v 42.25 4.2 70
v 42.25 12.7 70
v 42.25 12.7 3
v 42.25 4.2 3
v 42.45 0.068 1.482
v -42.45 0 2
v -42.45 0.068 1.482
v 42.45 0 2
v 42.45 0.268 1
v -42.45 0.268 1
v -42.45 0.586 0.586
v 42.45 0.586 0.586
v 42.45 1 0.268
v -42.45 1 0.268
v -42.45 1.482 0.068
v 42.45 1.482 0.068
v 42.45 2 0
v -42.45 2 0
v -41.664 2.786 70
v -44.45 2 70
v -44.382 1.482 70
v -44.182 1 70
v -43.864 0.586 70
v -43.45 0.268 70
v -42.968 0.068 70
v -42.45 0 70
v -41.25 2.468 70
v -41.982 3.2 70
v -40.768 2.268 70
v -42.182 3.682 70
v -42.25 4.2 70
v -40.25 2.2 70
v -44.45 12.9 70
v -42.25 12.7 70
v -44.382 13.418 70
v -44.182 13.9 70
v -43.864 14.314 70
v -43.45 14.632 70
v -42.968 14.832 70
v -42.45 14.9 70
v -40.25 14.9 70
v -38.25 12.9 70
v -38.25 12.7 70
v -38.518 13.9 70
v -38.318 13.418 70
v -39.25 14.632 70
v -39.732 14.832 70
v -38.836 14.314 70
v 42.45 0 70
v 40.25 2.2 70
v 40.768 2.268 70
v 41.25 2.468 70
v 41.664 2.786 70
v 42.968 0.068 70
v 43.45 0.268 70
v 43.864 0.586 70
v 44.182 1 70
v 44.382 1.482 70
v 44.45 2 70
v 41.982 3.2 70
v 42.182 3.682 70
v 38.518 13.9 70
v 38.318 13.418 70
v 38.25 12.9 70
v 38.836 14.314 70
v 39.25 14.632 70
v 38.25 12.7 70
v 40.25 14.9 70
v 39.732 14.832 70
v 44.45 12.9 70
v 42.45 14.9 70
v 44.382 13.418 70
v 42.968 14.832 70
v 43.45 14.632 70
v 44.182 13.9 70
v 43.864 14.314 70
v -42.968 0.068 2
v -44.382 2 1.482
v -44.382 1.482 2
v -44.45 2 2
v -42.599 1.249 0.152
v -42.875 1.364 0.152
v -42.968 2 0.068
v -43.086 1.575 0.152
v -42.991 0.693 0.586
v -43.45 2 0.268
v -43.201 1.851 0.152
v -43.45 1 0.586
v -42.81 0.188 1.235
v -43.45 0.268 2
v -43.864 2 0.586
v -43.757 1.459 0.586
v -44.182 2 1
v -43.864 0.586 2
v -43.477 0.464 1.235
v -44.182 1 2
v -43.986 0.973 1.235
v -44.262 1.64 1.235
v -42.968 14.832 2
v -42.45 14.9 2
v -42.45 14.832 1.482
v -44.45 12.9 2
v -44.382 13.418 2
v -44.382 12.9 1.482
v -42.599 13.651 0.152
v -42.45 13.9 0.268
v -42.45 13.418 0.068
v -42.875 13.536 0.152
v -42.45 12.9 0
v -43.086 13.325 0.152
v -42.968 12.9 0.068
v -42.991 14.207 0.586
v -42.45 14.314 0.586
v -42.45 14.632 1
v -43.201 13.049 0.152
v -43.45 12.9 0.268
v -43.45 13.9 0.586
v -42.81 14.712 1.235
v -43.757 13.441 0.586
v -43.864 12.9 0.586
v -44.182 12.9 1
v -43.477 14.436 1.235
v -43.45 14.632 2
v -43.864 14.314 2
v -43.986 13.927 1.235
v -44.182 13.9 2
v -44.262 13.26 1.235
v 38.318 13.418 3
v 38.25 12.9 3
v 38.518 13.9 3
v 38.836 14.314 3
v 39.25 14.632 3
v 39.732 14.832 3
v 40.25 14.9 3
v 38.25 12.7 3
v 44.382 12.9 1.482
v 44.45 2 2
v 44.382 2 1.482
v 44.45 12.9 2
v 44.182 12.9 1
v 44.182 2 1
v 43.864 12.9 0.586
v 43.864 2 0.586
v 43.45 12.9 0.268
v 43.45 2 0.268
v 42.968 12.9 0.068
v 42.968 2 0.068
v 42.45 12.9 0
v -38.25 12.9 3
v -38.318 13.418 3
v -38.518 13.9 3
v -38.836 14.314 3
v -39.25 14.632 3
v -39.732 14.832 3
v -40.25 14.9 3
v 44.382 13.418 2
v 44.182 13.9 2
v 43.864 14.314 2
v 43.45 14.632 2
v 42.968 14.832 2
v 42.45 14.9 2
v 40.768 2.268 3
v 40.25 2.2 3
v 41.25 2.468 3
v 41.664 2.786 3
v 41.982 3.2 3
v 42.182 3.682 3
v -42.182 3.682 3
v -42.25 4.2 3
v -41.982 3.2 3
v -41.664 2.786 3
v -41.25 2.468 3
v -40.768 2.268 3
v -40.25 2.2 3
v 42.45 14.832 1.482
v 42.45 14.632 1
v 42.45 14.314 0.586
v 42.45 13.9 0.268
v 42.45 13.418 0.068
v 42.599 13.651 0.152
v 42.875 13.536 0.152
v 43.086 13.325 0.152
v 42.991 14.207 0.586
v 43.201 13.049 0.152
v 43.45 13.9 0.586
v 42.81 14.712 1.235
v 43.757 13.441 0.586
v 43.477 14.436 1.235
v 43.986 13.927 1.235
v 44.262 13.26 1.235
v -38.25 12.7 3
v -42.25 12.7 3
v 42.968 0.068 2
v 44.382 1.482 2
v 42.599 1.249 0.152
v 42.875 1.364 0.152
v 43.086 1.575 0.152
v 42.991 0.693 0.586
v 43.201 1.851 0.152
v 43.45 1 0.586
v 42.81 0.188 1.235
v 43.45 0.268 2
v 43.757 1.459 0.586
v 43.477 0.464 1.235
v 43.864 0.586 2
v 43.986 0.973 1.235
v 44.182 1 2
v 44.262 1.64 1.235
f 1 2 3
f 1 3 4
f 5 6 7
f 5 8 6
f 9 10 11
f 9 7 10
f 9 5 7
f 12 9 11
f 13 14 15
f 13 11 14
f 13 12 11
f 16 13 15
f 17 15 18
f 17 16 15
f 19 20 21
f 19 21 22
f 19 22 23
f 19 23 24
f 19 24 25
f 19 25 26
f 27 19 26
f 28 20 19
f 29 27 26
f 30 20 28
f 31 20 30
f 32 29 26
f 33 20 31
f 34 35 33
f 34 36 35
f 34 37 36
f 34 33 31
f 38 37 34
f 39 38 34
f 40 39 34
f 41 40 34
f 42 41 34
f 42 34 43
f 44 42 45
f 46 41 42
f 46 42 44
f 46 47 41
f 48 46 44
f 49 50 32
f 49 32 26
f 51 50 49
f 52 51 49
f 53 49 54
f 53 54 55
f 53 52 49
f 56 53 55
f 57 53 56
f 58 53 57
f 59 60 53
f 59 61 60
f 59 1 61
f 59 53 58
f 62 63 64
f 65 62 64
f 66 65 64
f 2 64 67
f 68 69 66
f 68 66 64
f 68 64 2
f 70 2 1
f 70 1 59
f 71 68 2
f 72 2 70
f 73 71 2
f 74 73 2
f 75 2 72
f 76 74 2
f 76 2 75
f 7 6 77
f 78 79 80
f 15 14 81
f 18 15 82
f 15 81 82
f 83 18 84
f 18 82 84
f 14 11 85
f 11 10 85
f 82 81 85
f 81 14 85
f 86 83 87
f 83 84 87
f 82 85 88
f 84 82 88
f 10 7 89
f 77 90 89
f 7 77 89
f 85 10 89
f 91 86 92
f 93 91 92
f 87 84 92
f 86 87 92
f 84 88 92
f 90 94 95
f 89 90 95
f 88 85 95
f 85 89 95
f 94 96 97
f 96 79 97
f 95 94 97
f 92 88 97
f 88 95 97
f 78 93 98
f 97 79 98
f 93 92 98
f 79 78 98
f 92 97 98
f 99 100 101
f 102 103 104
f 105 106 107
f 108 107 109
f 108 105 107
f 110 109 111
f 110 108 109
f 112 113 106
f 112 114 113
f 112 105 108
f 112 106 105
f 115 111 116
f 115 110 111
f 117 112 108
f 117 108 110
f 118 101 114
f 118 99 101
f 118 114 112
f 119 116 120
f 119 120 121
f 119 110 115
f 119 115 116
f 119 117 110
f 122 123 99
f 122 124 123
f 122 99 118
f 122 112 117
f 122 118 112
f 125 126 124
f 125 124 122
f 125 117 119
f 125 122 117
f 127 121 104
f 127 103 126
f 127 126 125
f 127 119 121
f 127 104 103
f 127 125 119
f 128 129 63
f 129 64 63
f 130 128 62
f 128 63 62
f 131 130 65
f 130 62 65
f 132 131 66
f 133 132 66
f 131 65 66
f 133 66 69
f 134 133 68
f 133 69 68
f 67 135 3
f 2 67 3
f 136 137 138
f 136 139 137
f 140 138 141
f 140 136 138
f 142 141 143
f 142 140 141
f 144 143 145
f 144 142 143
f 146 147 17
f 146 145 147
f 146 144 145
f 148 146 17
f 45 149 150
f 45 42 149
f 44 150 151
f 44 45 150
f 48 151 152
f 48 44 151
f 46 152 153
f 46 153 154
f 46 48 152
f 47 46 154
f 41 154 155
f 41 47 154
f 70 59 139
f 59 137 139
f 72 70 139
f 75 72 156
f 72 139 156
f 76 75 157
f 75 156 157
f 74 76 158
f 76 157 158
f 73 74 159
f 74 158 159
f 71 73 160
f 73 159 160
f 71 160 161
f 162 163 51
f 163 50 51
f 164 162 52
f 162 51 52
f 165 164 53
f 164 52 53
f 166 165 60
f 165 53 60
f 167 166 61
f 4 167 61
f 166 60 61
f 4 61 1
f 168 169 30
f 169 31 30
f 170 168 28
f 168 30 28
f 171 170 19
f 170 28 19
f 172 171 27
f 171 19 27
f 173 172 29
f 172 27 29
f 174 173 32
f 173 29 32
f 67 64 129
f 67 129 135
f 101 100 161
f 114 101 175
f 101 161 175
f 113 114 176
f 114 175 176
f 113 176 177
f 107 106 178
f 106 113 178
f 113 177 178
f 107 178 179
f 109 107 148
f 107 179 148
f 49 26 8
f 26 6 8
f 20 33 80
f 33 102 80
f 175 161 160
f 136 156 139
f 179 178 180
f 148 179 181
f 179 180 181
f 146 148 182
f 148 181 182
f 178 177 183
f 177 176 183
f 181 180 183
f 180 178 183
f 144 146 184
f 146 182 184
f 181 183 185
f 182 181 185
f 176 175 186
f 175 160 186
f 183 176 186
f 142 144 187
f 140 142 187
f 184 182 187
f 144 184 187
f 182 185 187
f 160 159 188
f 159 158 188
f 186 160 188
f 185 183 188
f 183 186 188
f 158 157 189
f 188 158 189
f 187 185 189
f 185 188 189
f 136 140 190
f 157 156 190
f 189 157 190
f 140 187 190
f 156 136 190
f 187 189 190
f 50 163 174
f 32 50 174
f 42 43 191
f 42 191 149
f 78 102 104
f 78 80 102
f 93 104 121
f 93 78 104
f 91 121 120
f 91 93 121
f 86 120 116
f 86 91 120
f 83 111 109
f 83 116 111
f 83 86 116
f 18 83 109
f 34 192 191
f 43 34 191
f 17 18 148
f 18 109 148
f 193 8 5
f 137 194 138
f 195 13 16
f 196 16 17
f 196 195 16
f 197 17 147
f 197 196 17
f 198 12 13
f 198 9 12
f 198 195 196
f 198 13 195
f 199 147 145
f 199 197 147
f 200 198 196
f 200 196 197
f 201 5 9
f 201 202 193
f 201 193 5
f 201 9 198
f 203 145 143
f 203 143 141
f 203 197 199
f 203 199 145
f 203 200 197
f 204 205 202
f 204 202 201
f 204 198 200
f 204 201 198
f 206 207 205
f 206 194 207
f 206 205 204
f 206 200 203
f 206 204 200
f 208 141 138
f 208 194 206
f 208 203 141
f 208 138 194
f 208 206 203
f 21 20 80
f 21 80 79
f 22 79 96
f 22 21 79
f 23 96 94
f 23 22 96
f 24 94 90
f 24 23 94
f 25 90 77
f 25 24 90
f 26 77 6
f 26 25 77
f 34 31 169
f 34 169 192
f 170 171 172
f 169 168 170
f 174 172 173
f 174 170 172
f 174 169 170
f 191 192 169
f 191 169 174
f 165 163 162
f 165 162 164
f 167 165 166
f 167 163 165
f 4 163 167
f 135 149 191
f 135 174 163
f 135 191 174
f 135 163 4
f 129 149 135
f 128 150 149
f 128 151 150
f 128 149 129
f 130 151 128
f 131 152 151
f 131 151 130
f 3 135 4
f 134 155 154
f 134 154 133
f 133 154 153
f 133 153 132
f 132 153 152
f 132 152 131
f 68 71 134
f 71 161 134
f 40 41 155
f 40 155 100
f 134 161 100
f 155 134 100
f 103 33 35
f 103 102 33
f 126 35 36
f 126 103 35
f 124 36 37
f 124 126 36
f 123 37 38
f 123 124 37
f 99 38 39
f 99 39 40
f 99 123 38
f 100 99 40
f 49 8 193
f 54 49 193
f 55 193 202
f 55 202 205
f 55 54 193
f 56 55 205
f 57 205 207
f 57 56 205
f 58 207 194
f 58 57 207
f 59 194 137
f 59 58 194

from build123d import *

# Parameters (mm, degrees)
F1_DEPTH = 70
F3_DEPTH = 3
F4_R     = 2


with BuildPart() as f1:
    # F0 (on Top) → F1 (new body)
    with BuildSketch(Plane.XY):
        Polygon((-44.45, 0), (0, 0), (0, 2.2), (-42.25, 2.2), (-42.25, 12.7), (-38.25, 12.7), (-38.25, 14.9), (-44.45, 14.9), align=None)
        Polygon((0, 2.2), (0, 0), (44.45, 0), (44.45, 14.6), (44.45, 14.9), (38.25, 14.9), (38.25, 12.7), (42.25, 12.7), (42.25, 2.2), align=None)
    extrude(amount=F1_DEPTH)

    # F2 (on face) → F3 (join)
    with BuildSketch(Plane.XY):
        Polygon((0, 0), (44.45, 0), (44.45, 14.9), (-38.25, 14.9), (-38.25, 12.7), (-42.25, 12.7), (-42.25, 2.2), (0, 2.2), align=None)
        Polygon((-44.45, 0), (0, 0), (0, 2.2), (-42.25, 2.2), (-42.25, 12.7), (-38.25, 12.7), (-38.25, 14.9), (-44.45, 14.9), align=None)
    extrude(amount=F3_DEPTH)

    # F4
    f4_edges = [f1.edges().sort_by_distance(p)[0] for p in [
        (44.45, 0, 35),
        (44.45, 14.9, 35),
        (38.25, 14.9, 36.5),
        (42.25, 2.2, 36.5),
        (-38.25, 14.9, 36.5),
        (-42.25, 2.2, 36.5),
        (-44.45, 14.9, 35),
        (-44.45, 0, 35),
        (0, 0, 0),
        (0, 14.9, 0),
        (-44.45, 7.45, 0),
        (44.45, 7.45, 0),
    ]]
    fillet(f4_edges, radius=F4_R)


solid = f1.part
